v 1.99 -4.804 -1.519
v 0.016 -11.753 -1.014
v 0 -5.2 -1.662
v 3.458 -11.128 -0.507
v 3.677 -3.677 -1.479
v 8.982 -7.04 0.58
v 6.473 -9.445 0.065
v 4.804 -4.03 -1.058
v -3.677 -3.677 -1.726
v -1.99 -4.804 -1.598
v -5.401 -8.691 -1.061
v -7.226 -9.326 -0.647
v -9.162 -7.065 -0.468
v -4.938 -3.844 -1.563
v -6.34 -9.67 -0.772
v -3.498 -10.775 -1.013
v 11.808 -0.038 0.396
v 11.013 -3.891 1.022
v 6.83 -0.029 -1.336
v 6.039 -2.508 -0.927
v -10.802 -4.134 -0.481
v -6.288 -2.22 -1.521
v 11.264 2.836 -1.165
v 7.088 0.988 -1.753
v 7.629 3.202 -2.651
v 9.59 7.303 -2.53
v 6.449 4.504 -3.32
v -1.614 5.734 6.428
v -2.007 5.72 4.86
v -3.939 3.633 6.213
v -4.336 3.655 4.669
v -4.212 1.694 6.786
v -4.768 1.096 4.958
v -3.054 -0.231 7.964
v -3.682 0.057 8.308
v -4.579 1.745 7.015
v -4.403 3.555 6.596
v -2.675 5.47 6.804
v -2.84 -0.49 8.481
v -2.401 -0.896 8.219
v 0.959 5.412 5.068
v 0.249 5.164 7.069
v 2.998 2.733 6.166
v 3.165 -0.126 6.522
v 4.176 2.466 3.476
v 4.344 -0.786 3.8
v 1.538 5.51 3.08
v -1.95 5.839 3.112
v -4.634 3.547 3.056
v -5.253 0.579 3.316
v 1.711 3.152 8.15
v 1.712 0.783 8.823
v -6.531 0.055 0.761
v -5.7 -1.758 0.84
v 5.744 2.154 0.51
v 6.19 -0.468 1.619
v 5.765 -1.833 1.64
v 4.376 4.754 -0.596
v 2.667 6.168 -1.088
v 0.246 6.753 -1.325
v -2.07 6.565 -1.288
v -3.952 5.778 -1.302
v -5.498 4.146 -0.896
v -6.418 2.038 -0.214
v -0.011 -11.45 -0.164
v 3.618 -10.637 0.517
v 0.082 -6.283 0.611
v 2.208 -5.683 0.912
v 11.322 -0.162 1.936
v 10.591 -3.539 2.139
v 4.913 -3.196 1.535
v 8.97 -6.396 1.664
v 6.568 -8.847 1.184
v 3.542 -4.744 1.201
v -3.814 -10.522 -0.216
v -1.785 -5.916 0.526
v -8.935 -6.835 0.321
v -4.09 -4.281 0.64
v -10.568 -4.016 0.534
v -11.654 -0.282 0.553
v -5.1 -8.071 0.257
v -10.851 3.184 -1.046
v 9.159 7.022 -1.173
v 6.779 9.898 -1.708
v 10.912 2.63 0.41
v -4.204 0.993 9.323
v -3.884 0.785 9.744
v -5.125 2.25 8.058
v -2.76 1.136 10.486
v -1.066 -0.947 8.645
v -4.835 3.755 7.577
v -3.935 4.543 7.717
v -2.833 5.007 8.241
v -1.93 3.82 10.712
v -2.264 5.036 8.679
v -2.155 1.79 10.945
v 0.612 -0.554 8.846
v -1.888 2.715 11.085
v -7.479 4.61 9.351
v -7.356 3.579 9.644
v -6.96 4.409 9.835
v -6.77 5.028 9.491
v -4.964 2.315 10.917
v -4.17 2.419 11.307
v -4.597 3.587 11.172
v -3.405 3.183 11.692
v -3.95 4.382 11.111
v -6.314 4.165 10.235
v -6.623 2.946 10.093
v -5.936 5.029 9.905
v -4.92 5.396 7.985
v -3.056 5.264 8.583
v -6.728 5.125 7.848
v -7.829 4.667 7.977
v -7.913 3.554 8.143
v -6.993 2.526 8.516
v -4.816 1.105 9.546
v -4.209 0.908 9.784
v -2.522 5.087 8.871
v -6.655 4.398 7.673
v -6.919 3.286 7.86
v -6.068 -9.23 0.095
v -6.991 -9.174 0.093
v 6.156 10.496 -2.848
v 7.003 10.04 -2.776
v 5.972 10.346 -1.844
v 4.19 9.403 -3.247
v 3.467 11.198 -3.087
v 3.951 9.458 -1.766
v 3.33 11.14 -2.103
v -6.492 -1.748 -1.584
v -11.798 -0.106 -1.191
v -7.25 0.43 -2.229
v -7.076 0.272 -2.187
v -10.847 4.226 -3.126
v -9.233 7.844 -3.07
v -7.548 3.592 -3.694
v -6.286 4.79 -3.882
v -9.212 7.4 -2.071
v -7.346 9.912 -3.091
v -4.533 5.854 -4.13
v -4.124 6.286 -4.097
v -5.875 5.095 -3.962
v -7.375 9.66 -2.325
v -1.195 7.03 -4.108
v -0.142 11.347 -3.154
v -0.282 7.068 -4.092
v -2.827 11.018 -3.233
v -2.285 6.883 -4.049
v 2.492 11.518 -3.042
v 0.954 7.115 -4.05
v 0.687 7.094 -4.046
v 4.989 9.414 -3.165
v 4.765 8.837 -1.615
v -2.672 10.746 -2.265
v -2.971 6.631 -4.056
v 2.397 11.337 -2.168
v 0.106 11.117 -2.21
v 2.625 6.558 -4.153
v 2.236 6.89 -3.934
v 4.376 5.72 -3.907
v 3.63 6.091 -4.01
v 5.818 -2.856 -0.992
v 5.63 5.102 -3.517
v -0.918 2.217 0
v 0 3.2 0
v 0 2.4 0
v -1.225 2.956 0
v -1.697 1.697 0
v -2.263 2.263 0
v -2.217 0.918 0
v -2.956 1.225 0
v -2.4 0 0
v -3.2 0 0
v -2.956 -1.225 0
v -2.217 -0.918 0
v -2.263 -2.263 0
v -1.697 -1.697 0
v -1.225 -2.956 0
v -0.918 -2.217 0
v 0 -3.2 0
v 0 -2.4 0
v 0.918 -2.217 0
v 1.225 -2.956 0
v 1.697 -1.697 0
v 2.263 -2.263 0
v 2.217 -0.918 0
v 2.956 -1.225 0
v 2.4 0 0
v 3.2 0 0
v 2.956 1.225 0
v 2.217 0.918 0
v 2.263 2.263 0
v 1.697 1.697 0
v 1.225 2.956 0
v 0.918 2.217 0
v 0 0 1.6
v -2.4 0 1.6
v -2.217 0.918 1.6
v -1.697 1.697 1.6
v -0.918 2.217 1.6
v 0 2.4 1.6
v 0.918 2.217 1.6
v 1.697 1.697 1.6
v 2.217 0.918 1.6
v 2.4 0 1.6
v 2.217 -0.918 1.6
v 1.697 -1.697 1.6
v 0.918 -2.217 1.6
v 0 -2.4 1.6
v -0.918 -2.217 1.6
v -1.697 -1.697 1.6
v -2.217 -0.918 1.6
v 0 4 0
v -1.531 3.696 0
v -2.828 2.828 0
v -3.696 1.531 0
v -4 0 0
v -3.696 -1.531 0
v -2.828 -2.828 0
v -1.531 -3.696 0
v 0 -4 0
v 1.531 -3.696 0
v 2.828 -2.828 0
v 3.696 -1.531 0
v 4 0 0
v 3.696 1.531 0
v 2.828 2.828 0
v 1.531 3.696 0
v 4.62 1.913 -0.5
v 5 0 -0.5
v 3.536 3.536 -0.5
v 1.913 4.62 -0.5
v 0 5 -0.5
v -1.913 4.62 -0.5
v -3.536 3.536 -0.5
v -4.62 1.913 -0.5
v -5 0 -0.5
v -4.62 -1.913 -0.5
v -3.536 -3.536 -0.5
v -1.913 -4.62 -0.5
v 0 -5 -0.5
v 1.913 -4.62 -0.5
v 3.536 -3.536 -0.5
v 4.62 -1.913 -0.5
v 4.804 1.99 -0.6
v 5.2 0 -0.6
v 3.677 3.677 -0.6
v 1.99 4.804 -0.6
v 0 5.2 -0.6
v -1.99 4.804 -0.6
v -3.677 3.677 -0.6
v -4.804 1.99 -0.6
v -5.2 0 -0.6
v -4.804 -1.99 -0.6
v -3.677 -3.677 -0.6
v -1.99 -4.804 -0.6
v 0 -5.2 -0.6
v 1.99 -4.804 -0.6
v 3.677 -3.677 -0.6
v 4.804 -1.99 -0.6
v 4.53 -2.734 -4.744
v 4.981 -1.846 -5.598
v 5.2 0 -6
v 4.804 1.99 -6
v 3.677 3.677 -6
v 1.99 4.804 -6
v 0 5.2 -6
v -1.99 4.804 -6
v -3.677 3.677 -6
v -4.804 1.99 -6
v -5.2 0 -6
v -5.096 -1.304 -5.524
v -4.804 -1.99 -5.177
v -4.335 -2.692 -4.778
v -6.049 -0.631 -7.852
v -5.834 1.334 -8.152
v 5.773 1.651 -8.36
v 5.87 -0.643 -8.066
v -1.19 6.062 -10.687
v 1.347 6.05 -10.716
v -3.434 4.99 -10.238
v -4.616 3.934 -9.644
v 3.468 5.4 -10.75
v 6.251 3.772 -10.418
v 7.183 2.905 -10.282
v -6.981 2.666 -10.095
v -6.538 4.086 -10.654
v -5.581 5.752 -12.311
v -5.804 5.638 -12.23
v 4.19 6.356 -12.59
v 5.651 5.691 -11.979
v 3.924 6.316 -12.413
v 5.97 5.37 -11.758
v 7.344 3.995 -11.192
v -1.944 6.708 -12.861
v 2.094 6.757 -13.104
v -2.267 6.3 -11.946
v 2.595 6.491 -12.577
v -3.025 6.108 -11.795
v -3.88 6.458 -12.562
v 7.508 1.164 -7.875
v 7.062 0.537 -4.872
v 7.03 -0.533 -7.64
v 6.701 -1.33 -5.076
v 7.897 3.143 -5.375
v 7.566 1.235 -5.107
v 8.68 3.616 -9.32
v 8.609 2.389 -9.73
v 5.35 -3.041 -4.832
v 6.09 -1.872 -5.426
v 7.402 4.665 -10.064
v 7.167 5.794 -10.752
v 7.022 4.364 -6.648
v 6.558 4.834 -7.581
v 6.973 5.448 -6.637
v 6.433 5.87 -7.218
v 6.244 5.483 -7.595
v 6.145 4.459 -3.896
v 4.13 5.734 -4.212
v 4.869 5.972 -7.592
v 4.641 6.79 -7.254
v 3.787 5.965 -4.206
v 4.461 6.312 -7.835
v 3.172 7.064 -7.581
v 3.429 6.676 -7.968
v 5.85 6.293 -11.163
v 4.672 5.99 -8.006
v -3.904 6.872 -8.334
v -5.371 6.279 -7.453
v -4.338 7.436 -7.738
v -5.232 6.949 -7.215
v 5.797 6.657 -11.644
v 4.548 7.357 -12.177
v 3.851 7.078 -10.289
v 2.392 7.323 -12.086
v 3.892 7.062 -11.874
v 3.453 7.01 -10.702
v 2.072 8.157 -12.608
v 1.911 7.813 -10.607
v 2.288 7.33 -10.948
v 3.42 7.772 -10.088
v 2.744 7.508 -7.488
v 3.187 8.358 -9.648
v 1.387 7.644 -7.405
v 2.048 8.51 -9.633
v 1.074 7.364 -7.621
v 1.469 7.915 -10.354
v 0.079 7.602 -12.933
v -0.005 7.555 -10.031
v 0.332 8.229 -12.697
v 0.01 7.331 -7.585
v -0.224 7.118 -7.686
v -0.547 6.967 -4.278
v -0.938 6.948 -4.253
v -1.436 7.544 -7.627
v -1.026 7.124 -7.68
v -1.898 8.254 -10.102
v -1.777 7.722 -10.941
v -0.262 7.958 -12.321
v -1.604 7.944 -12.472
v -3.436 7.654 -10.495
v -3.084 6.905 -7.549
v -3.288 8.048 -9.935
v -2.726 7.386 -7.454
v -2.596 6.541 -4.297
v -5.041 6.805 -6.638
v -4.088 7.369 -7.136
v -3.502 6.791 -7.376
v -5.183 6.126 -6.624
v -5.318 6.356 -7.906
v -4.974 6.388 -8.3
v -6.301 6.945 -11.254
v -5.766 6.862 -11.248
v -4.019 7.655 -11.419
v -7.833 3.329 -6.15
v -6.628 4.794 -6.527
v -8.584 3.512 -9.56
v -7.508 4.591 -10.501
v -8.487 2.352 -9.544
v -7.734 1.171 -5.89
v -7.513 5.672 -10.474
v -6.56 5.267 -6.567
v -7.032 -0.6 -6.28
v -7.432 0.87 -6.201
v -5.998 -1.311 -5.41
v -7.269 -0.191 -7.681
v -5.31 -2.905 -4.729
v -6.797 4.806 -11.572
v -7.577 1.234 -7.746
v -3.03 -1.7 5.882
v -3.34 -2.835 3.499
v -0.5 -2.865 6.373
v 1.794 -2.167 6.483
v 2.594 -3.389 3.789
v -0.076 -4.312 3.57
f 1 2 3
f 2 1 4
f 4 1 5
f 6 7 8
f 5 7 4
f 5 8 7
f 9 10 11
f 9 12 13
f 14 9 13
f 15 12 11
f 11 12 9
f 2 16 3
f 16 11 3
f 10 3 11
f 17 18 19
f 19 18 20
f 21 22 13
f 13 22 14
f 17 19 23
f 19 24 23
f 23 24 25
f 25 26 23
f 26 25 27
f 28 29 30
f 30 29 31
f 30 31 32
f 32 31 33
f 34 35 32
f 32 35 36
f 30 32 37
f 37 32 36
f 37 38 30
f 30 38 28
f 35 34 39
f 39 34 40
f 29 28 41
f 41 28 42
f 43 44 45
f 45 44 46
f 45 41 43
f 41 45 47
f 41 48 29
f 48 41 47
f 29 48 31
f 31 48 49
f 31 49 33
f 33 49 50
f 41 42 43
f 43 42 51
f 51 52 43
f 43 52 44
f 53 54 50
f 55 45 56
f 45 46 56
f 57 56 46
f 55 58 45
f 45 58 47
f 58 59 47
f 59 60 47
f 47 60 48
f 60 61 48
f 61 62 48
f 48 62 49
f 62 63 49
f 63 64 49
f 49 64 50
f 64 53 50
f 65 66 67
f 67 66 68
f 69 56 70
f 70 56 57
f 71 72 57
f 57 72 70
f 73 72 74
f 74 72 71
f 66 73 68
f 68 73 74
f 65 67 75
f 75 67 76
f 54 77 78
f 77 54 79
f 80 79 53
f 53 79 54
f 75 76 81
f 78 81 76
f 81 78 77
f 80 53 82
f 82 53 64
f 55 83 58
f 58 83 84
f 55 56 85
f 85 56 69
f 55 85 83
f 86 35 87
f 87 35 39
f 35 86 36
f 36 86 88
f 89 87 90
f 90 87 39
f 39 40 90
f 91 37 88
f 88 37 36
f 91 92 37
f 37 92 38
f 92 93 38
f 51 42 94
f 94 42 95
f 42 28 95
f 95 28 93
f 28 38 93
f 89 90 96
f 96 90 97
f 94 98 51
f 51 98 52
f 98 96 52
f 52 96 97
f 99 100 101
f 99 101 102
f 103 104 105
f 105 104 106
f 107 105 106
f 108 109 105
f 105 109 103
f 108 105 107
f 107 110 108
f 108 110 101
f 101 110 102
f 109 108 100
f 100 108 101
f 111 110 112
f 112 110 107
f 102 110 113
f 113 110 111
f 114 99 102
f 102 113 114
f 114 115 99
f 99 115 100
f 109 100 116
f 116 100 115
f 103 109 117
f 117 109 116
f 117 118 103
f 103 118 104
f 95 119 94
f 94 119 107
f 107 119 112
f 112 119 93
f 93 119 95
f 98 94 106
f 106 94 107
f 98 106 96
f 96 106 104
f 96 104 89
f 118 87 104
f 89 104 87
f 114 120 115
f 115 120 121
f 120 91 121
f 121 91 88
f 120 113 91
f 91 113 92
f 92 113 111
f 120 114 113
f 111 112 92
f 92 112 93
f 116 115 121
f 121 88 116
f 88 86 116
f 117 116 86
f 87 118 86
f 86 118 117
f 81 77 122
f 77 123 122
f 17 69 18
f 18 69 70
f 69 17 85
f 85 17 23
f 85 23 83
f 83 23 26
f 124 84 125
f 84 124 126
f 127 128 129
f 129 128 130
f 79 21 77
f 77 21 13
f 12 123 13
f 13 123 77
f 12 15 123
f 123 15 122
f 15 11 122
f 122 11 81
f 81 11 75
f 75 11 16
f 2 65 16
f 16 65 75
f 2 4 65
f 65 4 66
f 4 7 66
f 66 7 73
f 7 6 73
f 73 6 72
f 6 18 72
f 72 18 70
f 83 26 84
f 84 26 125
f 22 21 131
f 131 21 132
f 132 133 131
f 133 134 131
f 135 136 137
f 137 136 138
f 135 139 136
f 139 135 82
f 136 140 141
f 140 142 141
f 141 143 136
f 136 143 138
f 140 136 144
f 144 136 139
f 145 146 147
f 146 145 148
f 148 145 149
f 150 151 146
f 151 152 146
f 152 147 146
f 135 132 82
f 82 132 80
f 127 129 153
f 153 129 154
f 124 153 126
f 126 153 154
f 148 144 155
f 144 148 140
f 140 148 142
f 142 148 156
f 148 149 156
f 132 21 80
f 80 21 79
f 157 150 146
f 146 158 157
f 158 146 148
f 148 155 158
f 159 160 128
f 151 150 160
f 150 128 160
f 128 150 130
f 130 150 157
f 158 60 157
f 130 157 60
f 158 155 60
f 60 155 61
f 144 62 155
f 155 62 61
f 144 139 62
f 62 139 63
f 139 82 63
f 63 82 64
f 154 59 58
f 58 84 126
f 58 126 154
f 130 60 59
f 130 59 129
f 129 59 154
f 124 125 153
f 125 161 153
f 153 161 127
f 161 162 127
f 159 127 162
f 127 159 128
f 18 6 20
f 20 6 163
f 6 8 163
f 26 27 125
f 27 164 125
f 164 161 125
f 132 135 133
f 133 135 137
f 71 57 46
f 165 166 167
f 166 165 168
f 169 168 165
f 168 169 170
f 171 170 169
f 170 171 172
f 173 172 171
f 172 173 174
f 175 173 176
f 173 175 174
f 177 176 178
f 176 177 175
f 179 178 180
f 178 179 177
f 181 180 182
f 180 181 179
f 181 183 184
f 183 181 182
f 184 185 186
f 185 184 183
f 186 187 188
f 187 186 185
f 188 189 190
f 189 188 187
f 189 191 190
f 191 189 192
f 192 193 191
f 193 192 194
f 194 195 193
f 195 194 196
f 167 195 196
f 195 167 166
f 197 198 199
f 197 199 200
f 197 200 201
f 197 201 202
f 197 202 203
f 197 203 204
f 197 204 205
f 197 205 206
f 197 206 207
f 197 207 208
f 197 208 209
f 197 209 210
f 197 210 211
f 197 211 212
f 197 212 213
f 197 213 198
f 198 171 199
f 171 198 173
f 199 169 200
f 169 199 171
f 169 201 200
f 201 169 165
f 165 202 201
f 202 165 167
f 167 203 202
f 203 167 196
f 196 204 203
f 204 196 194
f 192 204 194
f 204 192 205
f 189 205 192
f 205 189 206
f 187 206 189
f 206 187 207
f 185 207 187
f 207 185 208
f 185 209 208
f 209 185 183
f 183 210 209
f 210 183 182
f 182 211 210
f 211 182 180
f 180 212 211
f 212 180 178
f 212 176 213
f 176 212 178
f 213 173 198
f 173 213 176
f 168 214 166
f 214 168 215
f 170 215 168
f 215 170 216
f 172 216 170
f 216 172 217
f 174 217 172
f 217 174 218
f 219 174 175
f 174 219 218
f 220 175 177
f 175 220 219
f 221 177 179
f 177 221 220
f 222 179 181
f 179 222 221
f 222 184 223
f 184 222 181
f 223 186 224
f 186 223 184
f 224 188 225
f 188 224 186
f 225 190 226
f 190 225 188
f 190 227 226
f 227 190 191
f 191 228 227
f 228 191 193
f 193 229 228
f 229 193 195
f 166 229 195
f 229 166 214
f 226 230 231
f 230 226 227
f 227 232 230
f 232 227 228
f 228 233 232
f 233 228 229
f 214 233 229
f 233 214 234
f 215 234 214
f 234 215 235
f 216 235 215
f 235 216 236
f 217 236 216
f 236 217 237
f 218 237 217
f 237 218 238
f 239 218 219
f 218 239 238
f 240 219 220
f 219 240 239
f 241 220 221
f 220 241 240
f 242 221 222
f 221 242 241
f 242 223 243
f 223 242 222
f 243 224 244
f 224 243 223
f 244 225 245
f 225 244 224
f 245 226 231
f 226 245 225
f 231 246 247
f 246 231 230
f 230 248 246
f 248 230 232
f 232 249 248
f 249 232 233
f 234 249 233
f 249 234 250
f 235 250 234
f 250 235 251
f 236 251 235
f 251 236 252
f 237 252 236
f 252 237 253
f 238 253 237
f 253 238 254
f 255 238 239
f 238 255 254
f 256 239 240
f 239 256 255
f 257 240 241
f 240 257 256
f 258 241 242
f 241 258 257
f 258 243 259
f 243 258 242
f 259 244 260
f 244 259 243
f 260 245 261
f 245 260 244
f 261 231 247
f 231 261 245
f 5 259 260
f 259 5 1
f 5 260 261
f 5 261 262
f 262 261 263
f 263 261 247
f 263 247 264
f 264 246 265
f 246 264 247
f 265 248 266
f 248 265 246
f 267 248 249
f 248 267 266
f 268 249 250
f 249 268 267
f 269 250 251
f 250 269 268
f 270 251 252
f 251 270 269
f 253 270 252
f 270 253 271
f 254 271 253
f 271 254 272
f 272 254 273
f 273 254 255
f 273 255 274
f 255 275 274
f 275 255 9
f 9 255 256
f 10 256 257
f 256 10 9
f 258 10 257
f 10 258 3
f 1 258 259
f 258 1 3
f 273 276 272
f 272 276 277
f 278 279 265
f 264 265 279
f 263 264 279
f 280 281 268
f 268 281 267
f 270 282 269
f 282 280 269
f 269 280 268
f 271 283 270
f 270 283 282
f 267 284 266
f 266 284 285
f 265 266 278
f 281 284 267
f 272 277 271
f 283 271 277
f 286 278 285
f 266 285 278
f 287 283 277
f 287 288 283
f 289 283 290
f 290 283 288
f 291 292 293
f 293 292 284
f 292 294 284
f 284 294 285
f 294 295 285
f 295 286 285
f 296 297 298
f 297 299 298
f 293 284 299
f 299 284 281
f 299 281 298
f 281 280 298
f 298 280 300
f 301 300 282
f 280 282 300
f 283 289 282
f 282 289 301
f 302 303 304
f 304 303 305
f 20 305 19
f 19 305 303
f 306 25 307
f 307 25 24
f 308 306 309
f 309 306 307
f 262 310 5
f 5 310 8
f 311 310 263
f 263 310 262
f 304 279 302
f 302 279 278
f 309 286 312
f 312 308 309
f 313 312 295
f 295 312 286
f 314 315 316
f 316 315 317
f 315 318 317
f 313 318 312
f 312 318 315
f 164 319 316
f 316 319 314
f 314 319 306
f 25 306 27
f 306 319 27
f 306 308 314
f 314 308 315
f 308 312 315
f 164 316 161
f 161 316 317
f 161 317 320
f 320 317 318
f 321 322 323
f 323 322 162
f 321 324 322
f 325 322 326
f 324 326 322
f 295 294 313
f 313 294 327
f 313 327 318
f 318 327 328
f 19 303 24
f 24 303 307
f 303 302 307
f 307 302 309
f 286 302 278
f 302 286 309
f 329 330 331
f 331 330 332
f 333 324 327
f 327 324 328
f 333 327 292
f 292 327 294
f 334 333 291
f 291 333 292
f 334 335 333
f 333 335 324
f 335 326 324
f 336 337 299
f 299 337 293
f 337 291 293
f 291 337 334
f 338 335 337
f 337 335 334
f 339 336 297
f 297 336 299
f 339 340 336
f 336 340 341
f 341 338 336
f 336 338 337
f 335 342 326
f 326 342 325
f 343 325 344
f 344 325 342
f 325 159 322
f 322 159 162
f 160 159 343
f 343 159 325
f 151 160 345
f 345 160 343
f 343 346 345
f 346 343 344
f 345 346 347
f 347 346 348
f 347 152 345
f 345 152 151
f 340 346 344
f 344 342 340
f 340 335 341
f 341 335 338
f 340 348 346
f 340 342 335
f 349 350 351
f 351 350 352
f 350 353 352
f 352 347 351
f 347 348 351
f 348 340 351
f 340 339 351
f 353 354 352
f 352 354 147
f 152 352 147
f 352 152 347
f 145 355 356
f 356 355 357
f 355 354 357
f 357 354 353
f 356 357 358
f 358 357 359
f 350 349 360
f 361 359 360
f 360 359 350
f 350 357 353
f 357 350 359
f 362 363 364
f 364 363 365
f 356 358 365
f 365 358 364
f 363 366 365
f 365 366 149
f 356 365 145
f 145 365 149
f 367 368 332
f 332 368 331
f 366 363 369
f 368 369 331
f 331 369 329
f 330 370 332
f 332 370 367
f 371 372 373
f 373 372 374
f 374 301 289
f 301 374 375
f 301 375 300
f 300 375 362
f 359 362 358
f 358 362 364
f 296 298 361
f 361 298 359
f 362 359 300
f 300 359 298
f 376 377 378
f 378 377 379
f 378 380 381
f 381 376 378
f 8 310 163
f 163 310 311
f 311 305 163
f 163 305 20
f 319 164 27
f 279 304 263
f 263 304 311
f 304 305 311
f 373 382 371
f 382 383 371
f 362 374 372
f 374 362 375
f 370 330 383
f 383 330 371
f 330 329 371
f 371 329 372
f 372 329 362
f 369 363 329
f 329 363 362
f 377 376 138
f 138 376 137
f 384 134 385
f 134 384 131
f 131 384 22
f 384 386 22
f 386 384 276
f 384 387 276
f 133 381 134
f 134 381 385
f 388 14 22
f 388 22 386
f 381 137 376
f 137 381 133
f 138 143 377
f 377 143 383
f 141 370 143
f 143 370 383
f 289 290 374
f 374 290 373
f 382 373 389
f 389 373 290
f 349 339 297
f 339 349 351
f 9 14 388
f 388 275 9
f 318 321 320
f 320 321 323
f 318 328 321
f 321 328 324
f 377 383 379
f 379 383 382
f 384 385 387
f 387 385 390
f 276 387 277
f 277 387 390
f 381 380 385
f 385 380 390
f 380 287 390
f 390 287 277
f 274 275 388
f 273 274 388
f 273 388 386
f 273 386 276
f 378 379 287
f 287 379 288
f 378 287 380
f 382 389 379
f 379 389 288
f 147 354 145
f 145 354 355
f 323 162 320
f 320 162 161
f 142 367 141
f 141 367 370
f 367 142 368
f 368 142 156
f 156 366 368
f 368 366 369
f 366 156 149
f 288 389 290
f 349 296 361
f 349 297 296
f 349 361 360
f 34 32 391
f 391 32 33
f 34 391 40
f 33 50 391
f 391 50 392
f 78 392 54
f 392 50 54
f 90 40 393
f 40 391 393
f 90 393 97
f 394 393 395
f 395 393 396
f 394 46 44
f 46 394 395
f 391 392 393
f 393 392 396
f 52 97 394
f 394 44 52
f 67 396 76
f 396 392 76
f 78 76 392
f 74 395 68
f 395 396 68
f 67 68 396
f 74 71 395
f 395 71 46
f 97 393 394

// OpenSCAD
use <../lib.scad>
use <s/20606s01.scad>
use <s/20606s02.scad>
use <s/20606s03.scad>
function ldraw_lib__20606p06() = [
// 0 Minifig Hair Mid-Length Scraggly with Dual Mould Blue Floppy Witch Hat
// 0 Name: 20606p06.dat
// 0 Author: Lisa Winter [LisaWinter]
// 0 !LDRAW_ORG Part UPDATE 2026-07
// 0 !LICENSE Licensed under CC BY 4.0 : see CAreadme.txt
// 
// 0 BFC CERTIFY CCW
  [0,"BFC","CERTIFY"],
  [0,"BFC","CCW"],
// 
// 0 !CATEGORY Minifig Headwear
// 0 !KEYWORDS BAM, Bricklink 20606pb06, Brickowl 907908, Build-A-Minifigure
// 0 !KEYWORDS Colour Combination, Rebrickable 20606pr0004
// 
// 0 !HISTORY 2026-07-30 [OrionP] Official Update 2026-07
// 
// 0 // Hat
// 1 1 0 0 0 1 0 0 0 1 0 0 0 1 s\20606s01.dat
  [1,1,0,0,0,1,0,0,0,1,0,0,0,1, ldraw_lib__s__20606s01()],
// 0 // Hair
// 1 16 0 0 0 1 0 0 0 1 0 0 0 1 s\20606s02.dat
  [1,16,0,0,0,1,0,0,0,1,0,0,0,1, ldraw_lib__s__20606s02()],
// 0 // Patternable area
// 1 1 0 0 0 1 0 0 0 1 0 0 0 1 s\20606s03.dat
  [1,1,0,0,0,1,0,0,0,1,0,0,0,1, ldraw_lib__s__20606s03()],
];
module ldraw_lib__20606p06(step=0, col=false, unit=2/5, alt=false, line=0.2, solid=!$preview)
    makepoly(ldraw_lib__20606p06(), step=step, col=col, unit=unit, alt=alt, line=line, solid=solid);
ldraw_lib__20606p06(line=0.2);
